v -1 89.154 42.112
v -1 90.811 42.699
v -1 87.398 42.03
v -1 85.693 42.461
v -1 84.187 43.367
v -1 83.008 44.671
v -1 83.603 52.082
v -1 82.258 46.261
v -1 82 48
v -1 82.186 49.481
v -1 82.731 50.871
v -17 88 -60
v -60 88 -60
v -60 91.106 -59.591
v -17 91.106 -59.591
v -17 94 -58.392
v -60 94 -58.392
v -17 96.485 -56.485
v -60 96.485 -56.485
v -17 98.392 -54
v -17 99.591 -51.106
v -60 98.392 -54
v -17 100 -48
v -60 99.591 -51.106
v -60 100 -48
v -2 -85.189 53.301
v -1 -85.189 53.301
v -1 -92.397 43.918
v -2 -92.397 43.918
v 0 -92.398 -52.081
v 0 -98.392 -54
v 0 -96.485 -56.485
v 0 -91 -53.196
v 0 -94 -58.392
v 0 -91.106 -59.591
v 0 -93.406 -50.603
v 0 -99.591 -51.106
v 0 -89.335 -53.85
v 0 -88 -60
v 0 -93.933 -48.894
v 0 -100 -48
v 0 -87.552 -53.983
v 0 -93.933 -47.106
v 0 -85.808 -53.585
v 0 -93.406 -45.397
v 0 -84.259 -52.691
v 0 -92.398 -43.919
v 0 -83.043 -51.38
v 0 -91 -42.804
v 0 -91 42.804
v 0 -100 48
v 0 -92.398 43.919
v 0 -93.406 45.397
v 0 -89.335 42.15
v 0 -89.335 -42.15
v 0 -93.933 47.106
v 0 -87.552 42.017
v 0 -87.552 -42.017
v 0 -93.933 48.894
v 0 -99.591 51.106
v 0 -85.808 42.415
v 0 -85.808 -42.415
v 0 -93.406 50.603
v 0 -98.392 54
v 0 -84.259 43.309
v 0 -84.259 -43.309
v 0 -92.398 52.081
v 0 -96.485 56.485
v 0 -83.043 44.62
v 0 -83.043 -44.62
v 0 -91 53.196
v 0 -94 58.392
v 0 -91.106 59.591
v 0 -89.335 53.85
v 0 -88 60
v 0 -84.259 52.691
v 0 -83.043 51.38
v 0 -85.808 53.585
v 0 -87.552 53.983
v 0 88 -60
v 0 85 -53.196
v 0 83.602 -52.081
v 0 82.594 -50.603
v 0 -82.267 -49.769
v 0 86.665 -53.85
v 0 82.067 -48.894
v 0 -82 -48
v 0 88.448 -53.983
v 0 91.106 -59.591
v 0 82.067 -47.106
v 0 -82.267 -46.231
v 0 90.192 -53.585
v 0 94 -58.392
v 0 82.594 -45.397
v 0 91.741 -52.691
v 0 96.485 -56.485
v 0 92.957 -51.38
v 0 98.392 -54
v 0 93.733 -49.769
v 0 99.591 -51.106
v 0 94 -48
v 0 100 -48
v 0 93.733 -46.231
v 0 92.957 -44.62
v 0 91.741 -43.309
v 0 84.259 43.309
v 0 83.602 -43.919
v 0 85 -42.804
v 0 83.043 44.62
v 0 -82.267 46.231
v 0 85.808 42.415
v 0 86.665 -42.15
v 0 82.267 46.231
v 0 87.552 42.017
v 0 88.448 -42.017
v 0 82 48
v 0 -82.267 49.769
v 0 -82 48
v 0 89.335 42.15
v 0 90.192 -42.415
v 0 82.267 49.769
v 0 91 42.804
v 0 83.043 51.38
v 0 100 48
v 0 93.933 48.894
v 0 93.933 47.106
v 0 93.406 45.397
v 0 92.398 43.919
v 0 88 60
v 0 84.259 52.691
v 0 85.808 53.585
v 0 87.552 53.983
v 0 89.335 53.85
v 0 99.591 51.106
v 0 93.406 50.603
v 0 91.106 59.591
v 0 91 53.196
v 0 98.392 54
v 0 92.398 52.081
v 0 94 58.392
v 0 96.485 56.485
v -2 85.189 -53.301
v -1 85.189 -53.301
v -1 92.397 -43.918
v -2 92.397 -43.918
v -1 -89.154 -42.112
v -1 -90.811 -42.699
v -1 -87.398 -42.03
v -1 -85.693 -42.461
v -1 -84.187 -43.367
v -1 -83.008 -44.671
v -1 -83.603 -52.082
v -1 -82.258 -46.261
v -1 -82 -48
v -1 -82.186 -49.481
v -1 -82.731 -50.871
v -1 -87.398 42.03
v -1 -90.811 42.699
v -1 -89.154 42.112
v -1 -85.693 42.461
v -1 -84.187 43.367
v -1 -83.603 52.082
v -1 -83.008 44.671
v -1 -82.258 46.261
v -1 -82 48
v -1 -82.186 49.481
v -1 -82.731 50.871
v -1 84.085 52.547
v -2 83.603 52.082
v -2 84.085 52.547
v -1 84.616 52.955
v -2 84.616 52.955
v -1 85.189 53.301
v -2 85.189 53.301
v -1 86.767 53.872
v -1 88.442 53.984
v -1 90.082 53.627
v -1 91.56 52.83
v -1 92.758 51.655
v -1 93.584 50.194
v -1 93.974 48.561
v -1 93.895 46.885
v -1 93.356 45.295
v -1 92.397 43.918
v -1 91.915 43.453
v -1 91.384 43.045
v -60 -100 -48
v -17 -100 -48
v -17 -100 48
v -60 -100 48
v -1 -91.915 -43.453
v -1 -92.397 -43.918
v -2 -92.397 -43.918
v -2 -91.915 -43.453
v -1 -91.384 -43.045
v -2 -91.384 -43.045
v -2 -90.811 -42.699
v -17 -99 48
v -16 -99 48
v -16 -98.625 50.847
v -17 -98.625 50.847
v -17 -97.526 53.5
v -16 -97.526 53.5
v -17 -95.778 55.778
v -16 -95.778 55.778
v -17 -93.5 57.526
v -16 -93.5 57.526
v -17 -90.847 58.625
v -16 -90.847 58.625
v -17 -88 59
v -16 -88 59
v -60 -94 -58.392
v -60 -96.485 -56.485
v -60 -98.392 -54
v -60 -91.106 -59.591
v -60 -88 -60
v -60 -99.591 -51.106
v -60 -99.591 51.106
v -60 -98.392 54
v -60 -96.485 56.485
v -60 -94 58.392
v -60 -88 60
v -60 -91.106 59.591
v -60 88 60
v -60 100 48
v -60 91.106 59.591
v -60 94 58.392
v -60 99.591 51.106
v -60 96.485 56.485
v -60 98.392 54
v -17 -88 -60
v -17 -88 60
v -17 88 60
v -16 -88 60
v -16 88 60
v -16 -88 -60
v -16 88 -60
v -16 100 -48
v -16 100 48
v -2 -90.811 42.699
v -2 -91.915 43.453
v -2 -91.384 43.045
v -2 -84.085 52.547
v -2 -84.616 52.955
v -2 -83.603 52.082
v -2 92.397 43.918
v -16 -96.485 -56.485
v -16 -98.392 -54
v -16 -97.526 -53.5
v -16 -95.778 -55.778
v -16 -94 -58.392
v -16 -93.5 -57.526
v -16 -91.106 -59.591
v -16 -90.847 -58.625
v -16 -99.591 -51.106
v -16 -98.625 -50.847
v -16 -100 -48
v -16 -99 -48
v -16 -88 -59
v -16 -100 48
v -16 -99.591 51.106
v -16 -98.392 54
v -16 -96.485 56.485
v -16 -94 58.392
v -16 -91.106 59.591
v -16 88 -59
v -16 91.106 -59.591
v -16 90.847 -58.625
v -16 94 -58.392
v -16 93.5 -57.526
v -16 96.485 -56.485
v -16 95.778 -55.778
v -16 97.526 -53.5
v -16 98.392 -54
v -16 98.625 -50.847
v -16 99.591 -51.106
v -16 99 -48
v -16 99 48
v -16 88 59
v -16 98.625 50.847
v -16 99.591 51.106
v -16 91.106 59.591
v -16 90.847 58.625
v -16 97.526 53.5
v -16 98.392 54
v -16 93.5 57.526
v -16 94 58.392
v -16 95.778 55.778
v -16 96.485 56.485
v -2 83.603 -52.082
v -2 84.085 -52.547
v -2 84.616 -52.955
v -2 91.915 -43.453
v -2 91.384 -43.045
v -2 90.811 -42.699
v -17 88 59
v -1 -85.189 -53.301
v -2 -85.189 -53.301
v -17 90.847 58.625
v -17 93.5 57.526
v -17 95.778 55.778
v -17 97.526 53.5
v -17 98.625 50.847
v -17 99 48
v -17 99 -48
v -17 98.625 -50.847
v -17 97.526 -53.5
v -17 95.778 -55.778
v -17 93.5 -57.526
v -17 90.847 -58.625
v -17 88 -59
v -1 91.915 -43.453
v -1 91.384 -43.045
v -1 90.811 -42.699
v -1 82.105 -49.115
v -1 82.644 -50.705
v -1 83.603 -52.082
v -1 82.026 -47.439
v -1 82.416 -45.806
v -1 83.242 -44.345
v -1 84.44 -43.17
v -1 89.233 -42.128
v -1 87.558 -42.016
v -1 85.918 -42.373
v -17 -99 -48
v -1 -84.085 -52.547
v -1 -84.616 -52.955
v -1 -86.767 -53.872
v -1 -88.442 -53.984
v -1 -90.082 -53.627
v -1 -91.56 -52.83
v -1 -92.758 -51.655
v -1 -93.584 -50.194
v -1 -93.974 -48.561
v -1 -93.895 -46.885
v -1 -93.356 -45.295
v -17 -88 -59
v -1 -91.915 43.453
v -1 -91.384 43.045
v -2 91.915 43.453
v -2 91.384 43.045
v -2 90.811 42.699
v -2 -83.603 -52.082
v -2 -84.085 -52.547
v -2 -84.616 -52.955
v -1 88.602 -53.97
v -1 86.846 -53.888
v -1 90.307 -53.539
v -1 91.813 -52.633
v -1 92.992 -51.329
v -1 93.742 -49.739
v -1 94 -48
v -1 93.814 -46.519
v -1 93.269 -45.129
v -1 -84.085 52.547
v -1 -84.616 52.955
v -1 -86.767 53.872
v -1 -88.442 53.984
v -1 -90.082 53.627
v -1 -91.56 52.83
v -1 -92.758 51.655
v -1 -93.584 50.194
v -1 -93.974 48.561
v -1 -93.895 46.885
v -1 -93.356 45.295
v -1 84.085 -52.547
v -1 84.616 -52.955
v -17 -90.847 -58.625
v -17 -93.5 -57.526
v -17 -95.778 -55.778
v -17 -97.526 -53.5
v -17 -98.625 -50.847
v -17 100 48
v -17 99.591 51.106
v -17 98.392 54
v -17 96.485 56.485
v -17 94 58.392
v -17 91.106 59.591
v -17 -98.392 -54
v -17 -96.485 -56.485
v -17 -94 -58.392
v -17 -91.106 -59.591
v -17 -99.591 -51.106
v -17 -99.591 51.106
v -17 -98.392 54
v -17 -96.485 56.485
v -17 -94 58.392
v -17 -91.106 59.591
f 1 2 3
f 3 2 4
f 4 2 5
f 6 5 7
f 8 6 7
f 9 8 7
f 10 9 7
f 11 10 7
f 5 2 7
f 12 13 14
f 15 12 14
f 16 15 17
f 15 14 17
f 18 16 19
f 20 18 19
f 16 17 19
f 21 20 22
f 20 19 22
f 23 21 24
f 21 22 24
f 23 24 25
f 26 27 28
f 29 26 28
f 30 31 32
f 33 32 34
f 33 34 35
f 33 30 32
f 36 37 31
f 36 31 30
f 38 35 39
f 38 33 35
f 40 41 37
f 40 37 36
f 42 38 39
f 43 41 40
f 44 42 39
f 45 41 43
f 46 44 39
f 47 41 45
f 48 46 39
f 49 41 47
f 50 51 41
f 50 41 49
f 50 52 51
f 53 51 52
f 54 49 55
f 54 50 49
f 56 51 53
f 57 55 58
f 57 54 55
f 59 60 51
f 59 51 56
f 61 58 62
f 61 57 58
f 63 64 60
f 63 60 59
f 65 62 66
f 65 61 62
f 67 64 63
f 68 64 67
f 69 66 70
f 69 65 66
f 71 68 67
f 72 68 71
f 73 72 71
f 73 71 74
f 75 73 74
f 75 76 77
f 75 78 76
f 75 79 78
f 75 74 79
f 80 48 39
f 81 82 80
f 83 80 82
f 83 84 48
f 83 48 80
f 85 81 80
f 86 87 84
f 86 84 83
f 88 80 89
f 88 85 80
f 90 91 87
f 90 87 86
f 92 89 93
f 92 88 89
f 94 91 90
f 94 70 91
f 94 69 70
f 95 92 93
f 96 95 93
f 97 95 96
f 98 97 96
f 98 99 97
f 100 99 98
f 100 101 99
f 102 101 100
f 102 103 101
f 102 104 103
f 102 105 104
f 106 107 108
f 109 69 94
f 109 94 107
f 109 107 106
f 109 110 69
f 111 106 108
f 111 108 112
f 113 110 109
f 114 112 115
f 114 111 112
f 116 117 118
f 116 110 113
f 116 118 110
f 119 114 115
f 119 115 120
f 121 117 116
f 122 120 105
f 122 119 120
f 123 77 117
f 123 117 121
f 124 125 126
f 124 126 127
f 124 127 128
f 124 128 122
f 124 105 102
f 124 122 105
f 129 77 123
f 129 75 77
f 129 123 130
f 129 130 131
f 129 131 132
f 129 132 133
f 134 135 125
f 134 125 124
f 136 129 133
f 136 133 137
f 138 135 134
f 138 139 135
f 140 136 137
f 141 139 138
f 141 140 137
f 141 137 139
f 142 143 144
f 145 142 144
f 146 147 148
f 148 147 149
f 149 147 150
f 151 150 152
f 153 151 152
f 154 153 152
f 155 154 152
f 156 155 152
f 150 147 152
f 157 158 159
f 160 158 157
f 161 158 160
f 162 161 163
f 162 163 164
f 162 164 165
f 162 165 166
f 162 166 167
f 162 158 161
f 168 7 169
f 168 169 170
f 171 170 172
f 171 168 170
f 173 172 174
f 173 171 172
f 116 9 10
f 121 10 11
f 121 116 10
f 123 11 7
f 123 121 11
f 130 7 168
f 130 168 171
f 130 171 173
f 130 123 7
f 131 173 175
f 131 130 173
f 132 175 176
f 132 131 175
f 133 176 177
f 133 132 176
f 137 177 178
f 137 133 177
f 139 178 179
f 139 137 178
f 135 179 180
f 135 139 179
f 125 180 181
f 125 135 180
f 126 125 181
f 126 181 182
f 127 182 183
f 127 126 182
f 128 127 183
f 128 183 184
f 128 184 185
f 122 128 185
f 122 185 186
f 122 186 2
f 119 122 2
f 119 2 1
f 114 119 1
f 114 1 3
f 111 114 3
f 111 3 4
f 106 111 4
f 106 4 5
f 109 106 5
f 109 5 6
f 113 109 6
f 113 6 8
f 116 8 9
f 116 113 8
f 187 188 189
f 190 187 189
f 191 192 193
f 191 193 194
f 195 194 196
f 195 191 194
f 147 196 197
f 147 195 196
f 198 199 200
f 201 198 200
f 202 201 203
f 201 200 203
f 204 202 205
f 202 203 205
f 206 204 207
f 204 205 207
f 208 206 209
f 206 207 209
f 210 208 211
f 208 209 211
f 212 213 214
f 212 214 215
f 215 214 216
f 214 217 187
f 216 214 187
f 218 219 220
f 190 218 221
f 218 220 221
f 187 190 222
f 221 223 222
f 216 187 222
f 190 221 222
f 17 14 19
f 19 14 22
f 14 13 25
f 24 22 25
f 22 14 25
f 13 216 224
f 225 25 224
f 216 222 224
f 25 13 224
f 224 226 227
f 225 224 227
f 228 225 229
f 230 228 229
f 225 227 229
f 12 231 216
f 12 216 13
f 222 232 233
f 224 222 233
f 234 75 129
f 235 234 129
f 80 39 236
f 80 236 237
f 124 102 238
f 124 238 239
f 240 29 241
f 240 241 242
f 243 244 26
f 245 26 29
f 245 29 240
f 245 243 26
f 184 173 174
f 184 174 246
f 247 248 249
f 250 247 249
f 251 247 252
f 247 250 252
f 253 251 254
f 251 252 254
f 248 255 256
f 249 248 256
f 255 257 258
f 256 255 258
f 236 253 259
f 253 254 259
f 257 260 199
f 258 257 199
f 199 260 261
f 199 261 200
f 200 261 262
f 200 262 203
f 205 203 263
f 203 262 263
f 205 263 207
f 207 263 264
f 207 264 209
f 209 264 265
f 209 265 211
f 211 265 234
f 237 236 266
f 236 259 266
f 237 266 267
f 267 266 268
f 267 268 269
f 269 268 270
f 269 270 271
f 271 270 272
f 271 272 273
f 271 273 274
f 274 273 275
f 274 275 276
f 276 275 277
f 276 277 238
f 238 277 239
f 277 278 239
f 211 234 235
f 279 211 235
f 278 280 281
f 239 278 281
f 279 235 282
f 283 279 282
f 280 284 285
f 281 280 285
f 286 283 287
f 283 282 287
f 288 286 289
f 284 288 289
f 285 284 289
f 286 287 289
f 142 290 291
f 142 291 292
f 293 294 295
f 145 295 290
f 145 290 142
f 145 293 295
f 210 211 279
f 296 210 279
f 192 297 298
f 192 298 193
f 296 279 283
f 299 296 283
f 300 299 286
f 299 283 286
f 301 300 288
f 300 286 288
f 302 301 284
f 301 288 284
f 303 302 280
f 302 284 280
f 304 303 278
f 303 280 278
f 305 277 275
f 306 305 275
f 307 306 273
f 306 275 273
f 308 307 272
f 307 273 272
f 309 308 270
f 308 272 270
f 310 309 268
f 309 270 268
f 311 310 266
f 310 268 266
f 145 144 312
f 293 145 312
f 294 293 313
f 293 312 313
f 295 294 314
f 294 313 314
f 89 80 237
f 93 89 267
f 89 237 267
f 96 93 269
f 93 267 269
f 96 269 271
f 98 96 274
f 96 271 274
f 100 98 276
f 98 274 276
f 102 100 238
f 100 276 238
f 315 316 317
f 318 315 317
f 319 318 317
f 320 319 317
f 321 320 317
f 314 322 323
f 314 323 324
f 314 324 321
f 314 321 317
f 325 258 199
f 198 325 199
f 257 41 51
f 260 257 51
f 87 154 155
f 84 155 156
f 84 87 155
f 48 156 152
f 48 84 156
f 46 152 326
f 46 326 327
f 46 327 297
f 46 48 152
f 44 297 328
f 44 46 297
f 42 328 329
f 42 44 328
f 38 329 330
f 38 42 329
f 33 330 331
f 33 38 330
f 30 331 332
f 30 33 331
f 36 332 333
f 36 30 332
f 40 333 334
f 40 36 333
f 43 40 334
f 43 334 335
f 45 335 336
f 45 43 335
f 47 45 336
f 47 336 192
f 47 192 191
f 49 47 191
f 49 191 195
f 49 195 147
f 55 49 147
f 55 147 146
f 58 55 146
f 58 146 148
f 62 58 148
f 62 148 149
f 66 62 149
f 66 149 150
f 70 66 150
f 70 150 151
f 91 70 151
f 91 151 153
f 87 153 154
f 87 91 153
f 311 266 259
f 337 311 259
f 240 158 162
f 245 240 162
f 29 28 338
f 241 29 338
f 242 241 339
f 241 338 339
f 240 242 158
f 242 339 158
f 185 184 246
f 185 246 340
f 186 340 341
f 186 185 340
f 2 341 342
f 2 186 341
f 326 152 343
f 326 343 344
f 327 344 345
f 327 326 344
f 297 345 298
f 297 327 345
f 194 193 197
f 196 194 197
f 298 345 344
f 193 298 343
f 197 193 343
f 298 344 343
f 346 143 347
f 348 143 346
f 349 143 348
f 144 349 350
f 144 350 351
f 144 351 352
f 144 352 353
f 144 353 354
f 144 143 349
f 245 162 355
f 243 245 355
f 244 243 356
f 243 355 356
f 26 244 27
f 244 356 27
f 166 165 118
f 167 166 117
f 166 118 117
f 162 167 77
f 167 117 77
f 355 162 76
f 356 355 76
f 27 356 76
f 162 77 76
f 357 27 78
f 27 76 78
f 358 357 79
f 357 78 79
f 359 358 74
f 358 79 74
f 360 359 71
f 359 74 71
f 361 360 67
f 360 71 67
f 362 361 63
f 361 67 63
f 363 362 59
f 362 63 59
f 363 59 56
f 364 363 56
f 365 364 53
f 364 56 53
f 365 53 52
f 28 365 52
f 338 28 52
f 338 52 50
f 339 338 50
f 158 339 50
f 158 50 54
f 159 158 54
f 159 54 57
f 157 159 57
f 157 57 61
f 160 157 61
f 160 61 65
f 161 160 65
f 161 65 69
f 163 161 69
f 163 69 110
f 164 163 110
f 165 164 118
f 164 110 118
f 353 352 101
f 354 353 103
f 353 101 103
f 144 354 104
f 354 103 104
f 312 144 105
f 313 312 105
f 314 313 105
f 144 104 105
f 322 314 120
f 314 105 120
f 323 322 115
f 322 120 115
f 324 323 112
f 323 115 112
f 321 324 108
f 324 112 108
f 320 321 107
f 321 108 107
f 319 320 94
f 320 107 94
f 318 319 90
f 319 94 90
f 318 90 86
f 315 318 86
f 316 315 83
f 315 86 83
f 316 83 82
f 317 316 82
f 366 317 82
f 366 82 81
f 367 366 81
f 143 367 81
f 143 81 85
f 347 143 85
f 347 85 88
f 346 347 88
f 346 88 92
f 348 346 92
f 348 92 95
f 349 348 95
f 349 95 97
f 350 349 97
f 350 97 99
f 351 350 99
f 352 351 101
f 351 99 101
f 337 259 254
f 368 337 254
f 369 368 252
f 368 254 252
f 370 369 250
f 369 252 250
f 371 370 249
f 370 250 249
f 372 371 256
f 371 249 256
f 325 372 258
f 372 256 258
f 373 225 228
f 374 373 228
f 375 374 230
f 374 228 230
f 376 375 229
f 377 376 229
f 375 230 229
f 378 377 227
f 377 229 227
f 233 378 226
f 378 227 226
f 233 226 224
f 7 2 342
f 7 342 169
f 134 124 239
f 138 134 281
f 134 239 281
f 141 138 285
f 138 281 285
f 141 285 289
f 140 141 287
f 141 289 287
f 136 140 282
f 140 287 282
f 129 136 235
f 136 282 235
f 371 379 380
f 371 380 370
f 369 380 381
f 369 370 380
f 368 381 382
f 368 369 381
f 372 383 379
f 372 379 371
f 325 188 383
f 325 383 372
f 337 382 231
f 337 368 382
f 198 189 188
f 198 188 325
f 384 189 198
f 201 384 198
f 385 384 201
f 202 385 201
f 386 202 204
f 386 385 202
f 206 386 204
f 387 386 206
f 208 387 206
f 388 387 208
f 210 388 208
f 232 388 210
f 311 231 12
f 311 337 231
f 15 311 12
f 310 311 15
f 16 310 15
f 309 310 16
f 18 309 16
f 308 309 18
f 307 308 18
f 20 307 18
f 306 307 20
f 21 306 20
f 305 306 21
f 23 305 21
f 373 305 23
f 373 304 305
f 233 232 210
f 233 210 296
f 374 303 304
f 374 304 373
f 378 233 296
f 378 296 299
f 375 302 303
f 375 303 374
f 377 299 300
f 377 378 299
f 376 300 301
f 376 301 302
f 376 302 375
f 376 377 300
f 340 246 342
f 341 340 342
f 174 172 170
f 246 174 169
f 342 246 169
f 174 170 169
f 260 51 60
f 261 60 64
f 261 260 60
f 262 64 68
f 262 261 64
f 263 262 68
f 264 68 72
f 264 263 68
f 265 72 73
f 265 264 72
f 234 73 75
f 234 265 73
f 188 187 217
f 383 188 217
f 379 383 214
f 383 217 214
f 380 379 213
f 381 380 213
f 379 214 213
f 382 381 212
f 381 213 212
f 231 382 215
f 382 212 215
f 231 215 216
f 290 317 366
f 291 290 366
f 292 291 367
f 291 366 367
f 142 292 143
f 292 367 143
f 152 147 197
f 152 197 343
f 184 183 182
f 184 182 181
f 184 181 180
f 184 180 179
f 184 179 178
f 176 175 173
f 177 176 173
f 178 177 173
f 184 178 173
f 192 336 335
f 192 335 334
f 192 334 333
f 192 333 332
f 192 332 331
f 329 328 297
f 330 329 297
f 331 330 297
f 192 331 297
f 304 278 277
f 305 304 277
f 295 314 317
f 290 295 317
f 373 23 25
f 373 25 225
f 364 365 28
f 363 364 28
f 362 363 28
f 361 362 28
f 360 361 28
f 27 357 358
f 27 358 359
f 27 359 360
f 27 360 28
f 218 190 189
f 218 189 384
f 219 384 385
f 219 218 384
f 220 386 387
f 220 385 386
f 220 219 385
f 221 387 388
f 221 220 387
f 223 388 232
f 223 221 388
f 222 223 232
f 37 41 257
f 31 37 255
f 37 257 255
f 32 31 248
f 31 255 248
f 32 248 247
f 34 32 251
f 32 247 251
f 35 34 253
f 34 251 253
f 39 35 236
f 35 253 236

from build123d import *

# Parameters (mm, degrees)
F0_W             = 200
F0_H             = 120
F1_DEPTH         = 60
F2_R             = 12
F5_DEPTH         = 1
F6_R             = 6
F7_DEPTH         = 1
F7_COPIES2_COUNT = 2
F7_COPIES2_PITCH = 200.479425
F9_DEPTH         = 1
F9_COPIES2_COUNT = 2
F9_COPIES2_PITCH = 200.479425


# Not quite as in the source:
# - a pattern or mirror of a feature is missing from the dataset's text; its kind, count and spacing are read off the source's solid


with BuildPart() as f1:
    # F0 (on Right) → F1 (new body)
    with BuildSketch(Plane.YZ):
        Rectangle(F0_W, F0_H)
    extrude(amount=-F1_DEPTH)

    # F2
    f2_edges = [f1.edges().sort_by_distance(p)[0] for p in [
        (-30, -100, 60),
        (-30, -100, -60),
        (-30, 100, -60),
        (-30, 100, 60),
    ]]
    fillet(f2_edges, radius=F2_R)

    # F4 (on offset) → F5 (cut)
    with BuildSketch(Plane.YZ.offset(-16)):
        with BuildLine():
            ThreePointArc((-88, 60), (-96.4852813742, 56.4852813742), (-100, 48))
            Line((-100, 48), (-100, -48))
            ThreePointArc((-100, -48), (-96.4852813742, -56.4852813742), (-88, -60))
            Line((-88, -60), (88, -60))
            ThreePointArc((88, -60), (96.4852813742, -56.4852813742), (100, -48))
            Line((100, -48), (100, 48))
            ThreePointArc((100, 48), (96.4852813742, 56.4852813742), (88, 60))
            Line((88, 60), (-88, 60))
        make_face()
        with BuildLine():
            ThreePointArc((-99, 48), (-95.7781745931, 55.7781745931), (-88, 59))
            Line((-88, 59), (88, 59))
            ThreePointArc((88, 59), (95.7781745931, 55.7781745931), (99, 48))
            Line((99, 48), (99, -48))
            ThreePointArc((99, -48), (95.7781745931, -55.7781745931), (88, -59))
            Line((88, -59), (-88, -59))
            ThreePointArc((-88, -59), (-95.7781745931, -55.7781745931), (-99, -48))
            Line((-99, -48), (-99, 48))
        make_face(mode=Mode.SUBTRACT)
    extrude(amount=-F5_DEPTH, mode=Mode.SUBTRACT)

    # F6 (on face) → F7 (cut)
    with BuildSketch(Plane.YZ):
        with Locations((-88, 48)):
            Circle(F6_R)
    f7 = extrude(amount=-F7_DEPTH, mode=Mode.SUBTRACT)

    # F7_copies: F7 across plane
    add(f7.mirror(Plane.ZX), mode=Mode.SUBTRACT)

    # F7_copies1: F7 across plane
    add(f7.mirror(Plane(origin=(0, 0, 0), x_dir=(-1, 0, 0), z_dir=(0, 0, -1))), mode=Mode.SUBTRACT)

    # F7_copies2: F7 ×2
    with Locations(*[Vector(0, 0.8778955729, -0.4788521307) * (i * F7_COPIES2_PITCH) for i in range(1, F7_COPIES2_COUNT)]):
        add(f7, mode=Mode.SUBTRACT)

    # F8 (on face) → F9 (cut)
    with BuildSketch(Plane.YZ.offset(-1)):
        with BuildLine():
            Line((-90.8109403928, 42.6991874106), (-83.6029990627, 52.0824481328))
            ThreePointArc((-83.6029990627, 52.0824481328), (-84.3449066302, 52.7581816336), (-85.1890596072, 53.3008125894))
            Line((-85.1890596072, 53.3008125894), (-92.3970009373, 43.9175518672))
            ThreePointArc((-92.3970009373, 43.9175518672), (-91.6550933698, 43.2418183664), (-90.8109403928, 42.6991874106))
        make_face()
    f9 = extrude(amount=-F9_DEPTH, mode=Mode.SUBTRACT)

    # F9_copies: F9 across plane
    add(f9.mirror(Plane.ZX), mode=Mode.SUBTRACT)

    # F9_copies1: F9 across plane
    add(f9.mirror(Plane(origin=(0, 0, 0), x_dir=(-1, 0, 0), z_dir=(0, 0, -1))), mode=Mode.SUBTRACT)

    # F9_copies2: F9 ×2
    with Locations(*[Vector(0, 0.8778955729, -0.4788521307) * (i * F9_COPIES2_PITCH) for i in range(1, F9_COPIES2_COUNT)]):
        add(f9, mode=Mode.SUBTRACT)


solid = f1.part
